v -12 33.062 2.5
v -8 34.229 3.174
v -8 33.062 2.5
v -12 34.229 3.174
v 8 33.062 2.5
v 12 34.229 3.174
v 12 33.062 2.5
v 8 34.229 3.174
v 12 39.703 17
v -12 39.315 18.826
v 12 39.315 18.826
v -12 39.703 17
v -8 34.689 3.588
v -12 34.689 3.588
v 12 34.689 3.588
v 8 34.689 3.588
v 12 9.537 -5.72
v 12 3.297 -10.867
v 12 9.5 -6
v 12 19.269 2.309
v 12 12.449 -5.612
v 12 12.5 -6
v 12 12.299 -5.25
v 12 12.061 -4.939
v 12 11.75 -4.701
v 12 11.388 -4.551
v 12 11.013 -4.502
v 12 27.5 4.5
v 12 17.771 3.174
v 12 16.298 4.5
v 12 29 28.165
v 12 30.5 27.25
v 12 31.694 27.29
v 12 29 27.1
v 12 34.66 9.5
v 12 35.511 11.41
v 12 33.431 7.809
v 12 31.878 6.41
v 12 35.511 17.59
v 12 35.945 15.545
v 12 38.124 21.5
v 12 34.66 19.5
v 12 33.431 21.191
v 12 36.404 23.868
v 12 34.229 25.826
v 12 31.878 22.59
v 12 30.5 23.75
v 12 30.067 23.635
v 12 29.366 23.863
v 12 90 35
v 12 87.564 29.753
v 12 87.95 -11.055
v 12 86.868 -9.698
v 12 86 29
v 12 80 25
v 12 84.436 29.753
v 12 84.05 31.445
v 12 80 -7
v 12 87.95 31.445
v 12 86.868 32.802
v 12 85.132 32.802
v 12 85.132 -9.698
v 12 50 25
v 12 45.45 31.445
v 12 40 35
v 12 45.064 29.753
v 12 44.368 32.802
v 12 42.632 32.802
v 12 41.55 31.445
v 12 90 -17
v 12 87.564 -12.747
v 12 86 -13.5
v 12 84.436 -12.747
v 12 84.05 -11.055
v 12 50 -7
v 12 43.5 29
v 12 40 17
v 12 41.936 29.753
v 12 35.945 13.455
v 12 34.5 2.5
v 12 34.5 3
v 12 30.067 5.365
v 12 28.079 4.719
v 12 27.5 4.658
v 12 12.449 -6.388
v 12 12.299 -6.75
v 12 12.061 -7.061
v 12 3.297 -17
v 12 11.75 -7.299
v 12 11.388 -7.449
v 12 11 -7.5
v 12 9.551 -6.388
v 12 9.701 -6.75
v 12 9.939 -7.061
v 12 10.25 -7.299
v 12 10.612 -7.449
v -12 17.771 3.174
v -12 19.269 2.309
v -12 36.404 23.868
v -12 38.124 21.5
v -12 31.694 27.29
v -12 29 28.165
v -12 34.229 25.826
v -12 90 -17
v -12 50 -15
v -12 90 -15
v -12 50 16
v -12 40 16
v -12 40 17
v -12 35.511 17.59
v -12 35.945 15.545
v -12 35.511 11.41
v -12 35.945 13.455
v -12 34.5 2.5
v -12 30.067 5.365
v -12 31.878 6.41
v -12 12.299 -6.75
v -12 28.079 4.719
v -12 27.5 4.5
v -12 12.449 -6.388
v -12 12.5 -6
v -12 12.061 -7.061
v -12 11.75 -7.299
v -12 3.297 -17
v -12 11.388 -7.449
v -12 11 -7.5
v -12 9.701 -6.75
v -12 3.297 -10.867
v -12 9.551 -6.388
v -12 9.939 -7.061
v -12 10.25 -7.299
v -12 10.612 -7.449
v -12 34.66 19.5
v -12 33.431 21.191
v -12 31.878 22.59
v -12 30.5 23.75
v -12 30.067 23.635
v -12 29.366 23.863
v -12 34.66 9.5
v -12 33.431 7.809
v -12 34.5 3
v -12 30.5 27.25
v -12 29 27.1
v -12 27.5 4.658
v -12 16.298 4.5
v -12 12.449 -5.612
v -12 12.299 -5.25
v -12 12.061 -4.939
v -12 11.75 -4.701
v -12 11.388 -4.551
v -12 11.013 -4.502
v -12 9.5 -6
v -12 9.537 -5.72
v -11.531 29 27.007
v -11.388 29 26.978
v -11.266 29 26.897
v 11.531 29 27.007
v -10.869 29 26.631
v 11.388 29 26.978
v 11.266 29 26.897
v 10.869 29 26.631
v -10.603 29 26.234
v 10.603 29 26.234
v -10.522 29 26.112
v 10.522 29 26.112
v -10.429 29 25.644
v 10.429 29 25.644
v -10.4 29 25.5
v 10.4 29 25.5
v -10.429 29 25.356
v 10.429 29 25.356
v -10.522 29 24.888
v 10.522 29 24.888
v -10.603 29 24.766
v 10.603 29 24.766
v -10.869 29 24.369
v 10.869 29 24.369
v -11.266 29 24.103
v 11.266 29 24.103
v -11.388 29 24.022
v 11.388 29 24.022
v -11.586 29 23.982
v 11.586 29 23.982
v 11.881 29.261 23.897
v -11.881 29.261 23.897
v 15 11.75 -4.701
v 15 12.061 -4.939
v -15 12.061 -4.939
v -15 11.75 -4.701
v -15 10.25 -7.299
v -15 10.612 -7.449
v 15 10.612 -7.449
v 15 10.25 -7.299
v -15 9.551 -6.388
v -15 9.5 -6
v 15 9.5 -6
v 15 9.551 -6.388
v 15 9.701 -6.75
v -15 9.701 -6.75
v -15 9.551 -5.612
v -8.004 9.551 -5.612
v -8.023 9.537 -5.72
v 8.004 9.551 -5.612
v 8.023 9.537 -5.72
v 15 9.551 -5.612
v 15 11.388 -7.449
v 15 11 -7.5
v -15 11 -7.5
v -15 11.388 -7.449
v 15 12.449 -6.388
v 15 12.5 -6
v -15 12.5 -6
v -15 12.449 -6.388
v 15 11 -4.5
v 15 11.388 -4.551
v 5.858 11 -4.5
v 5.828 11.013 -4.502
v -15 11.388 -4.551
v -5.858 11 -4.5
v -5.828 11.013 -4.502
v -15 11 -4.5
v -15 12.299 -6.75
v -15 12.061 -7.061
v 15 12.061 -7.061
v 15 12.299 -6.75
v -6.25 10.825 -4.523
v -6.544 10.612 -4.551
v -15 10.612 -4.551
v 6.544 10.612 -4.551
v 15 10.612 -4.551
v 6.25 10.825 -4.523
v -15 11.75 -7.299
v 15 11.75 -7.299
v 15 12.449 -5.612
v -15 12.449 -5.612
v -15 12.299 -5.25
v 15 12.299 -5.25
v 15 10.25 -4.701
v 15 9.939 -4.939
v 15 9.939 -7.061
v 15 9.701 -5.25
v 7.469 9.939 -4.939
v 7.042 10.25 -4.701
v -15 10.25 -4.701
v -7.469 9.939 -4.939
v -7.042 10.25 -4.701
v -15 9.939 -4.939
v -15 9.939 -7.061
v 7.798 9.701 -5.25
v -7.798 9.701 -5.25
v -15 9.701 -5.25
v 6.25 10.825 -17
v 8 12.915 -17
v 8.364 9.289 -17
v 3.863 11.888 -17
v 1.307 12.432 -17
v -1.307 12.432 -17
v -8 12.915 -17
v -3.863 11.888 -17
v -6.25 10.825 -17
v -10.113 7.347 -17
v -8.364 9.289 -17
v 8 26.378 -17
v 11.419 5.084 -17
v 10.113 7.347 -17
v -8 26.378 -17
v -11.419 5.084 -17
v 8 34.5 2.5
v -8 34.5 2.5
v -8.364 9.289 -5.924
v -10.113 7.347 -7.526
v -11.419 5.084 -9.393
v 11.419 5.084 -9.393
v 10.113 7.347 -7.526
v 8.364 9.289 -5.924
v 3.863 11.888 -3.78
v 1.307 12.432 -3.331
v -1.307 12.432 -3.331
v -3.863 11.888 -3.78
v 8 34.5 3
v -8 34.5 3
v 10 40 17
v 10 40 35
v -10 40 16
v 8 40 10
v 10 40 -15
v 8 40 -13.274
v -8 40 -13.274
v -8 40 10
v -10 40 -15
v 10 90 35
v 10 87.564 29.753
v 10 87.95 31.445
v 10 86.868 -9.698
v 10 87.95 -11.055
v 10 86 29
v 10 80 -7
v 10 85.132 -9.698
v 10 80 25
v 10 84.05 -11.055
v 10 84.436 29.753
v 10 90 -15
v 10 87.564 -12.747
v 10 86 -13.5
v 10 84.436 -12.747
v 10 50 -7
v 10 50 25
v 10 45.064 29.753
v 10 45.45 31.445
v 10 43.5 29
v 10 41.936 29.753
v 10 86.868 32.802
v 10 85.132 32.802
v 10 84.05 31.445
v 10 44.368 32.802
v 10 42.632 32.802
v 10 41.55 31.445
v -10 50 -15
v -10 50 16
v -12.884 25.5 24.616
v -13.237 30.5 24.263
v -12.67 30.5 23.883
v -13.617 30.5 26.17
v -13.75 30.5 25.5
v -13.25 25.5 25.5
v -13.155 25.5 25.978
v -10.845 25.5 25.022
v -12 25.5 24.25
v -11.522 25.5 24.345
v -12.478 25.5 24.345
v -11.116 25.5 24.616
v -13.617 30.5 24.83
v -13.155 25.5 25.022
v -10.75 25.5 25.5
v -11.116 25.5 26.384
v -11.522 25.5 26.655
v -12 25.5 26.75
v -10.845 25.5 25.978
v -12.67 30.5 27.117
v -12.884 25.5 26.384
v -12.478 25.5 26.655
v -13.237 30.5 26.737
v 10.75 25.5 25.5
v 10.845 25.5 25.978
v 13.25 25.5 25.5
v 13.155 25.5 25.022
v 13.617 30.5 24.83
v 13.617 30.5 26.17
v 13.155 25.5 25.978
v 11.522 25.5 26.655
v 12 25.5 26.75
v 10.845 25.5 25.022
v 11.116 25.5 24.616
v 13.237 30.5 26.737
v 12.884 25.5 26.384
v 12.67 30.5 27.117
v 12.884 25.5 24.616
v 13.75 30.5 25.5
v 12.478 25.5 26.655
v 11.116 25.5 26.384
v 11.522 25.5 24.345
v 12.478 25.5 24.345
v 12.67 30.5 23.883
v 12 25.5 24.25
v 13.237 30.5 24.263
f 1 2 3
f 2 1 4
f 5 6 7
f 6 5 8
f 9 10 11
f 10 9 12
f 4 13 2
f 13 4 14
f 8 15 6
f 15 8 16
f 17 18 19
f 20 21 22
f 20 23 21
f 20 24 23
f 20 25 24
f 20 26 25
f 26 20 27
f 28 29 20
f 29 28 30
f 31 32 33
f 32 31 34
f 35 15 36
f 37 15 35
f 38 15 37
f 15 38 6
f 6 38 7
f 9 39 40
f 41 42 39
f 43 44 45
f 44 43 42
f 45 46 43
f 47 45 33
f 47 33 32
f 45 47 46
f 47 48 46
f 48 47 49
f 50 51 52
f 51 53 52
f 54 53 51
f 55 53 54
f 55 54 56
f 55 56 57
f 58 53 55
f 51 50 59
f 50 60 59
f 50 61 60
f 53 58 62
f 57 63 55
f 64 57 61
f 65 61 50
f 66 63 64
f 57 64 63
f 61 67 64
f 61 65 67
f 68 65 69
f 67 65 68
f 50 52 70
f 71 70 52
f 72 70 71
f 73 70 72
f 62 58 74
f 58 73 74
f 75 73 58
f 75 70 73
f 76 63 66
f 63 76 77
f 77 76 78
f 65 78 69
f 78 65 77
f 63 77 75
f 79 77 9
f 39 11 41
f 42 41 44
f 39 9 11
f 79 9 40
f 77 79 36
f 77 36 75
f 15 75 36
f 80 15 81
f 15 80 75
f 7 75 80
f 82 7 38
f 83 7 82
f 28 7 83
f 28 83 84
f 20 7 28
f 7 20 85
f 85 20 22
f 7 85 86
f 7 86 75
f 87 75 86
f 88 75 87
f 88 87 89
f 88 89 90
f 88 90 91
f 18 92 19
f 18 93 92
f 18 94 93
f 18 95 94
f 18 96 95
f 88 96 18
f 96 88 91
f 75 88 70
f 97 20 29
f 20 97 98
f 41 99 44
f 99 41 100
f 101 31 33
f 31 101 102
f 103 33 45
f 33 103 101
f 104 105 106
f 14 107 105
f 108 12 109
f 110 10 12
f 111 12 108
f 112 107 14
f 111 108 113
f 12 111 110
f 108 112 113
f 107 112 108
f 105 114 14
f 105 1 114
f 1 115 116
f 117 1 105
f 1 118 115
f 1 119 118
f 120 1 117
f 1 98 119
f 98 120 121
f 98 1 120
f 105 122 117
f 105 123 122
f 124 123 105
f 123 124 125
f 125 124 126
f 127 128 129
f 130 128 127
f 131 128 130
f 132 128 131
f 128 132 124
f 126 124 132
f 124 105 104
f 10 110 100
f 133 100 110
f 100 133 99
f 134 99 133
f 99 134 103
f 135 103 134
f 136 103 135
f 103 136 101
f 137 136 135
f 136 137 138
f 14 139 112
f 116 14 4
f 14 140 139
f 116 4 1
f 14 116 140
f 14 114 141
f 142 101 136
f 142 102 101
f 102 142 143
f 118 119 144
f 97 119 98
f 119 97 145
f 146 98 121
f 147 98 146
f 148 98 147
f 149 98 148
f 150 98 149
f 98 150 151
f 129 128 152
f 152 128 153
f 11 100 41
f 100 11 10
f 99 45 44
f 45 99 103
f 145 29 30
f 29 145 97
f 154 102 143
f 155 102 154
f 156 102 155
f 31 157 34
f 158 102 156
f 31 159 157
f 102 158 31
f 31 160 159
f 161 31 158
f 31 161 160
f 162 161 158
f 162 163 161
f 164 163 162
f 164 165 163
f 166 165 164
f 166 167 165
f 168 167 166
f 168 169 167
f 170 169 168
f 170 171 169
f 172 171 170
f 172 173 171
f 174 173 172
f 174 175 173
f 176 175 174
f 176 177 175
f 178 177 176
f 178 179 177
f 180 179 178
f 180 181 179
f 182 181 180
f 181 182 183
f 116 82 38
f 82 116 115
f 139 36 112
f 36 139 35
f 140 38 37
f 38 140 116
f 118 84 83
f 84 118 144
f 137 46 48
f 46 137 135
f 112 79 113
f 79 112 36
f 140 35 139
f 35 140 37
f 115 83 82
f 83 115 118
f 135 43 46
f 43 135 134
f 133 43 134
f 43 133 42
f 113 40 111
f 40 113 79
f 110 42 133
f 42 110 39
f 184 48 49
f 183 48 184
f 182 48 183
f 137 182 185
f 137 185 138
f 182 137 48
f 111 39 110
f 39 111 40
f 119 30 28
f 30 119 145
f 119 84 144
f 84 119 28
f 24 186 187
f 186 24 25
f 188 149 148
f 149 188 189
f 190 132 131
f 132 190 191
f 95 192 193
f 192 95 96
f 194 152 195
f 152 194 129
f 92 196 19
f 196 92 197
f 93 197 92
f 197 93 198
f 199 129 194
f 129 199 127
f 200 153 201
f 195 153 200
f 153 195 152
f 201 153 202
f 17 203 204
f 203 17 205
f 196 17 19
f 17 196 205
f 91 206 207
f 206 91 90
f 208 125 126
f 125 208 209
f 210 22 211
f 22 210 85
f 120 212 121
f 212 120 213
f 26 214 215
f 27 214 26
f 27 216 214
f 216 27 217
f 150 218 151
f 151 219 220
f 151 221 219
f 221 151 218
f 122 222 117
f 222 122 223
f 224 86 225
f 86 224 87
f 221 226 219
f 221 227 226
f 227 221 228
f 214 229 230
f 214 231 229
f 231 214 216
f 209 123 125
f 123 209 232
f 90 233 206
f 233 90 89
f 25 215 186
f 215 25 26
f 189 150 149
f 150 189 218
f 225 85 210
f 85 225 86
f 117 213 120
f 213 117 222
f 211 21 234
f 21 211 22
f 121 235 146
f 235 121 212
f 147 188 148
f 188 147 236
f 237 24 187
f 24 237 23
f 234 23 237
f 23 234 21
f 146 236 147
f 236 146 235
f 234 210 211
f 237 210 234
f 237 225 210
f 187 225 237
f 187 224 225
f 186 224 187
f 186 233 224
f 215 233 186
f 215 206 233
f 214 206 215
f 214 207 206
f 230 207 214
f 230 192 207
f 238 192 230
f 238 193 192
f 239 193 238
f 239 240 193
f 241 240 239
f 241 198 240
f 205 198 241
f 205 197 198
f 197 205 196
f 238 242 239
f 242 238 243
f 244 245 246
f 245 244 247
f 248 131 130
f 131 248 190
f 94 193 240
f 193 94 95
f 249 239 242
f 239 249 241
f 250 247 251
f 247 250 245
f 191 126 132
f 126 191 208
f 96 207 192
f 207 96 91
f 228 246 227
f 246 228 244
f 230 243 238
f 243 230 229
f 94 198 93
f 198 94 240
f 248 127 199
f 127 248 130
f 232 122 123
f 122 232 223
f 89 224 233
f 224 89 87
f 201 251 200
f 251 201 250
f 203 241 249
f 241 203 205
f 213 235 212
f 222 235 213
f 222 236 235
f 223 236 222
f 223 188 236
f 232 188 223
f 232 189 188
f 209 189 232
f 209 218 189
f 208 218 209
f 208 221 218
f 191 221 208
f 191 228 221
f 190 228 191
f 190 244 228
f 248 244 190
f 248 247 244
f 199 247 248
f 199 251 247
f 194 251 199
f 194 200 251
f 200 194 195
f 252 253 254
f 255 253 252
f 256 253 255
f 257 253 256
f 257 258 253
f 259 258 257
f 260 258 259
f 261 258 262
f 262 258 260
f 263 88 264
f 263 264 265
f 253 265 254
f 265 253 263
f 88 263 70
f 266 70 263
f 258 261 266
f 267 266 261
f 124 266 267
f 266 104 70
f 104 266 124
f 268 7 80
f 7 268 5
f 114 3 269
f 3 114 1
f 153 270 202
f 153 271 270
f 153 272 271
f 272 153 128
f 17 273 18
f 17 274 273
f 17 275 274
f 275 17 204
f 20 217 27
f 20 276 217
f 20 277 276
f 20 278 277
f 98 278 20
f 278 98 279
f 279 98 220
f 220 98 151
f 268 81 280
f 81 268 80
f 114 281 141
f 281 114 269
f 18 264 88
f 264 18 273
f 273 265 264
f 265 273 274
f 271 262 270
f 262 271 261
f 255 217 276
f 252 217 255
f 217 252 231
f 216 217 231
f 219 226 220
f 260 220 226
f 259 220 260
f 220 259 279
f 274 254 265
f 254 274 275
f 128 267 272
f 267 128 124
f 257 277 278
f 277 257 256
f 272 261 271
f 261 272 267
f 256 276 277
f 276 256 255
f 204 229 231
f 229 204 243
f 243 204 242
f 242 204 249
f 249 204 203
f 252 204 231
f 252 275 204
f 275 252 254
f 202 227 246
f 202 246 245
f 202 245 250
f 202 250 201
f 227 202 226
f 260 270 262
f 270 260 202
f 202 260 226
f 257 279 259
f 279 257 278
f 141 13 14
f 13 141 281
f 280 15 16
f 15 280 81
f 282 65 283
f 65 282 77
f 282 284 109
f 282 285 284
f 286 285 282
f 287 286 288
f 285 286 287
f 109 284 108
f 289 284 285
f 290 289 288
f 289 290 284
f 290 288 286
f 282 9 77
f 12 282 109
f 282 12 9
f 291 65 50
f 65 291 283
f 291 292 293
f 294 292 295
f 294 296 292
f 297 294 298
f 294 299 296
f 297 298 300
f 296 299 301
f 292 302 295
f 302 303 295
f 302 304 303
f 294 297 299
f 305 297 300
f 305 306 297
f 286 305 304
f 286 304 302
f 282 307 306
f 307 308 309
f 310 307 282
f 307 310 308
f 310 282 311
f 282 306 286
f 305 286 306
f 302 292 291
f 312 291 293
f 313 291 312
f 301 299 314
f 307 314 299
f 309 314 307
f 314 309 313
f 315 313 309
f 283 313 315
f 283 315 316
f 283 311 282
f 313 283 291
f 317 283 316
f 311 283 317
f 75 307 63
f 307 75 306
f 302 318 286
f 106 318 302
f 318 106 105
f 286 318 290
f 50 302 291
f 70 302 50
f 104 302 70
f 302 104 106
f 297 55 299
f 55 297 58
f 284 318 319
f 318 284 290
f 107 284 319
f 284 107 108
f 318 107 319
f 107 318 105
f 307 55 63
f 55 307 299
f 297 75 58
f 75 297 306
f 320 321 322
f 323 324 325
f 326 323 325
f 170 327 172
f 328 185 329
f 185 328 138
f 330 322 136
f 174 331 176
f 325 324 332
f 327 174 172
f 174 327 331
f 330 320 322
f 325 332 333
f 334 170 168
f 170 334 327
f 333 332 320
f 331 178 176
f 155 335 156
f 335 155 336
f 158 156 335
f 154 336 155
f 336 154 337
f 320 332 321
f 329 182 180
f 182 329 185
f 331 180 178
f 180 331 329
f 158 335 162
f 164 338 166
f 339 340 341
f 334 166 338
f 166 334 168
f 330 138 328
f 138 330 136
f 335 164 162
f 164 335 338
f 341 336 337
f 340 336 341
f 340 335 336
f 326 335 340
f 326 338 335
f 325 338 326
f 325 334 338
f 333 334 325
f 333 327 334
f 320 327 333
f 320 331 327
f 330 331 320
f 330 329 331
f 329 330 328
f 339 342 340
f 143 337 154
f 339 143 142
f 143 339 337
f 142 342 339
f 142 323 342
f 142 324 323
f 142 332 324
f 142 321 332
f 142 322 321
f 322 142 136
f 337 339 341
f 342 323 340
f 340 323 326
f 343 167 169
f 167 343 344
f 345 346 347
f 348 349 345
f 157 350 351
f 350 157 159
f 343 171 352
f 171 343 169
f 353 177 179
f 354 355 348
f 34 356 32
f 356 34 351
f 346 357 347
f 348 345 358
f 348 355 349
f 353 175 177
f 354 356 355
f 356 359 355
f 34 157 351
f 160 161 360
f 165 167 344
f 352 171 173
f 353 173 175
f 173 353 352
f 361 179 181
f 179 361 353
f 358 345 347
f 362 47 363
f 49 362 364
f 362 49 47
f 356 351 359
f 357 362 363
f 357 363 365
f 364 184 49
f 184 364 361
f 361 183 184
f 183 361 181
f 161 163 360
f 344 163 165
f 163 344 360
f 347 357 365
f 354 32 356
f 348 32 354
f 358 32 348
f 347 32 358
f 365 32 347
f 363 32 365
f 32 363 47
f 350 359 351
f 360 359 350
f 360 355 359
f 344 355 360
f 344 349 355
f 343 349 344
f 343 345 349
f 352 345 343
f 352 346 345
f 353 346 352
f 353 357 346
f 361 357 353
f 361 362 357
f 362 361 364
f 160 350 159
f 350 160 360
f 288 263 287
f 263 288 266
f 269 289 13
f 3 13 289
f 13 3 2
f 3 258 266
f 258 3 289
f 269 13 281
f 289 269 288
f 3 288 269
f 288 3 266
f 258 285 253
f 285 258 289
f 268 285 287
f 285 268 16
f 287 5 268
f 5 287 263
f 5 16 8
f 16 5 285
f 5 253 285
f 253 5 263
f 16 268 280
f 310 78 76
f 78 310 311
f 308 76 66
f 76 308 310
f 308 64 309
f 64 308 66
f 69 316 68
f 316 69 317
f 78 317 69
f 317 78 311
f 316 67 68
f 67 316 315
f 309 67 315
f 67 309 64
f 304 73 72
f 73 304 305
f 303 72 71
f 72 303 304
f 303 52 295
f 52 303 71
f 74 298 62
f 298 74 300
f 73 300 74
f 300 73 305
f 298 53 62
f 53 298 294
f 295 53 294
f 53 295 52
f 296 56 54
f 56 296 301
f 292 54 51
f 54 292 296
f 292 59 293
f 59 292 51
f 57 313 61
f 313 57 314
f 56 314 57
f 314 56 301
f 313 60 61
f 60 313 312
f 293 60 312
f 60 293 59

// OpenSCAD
//use <e3d.scad>;
////translate([0,0,46])rotate([180,0,0])e3d();
//#translate([0,1+15,50+5])cube([50,2,100],center=true);
//
//#translate([0,-5,36])cube([36,10,10],center=true);
//
//color("blue")translate([0,0,-20])sphere(r=1);
//#translate([0,15,32+5])rotate([-90,0,0])import("carriaje 3 nuevo.stl", convexity = 8);
//
//difference(){
//union(){
//    difference(){
//        hull(){
//            translate([-11-13,-40+15,30])rotate([0,90,0])40mmfan();
//            rotate([0,0,180])translate([-11-13,-40+25,30])rotate([0,90,0])40mmfan();
//            
//        }
//
//        hull(){
//            translate([-11-5,-5,10])rotate([0,90,0])cylinder(r=38/2,h=1);
//            cylinder(r=17/2,h=26);
//        }
//    }
//
//
//    hull(){
//        translate([0,-5,0])cube([22,39,1],center=true);
//        translate([0,-5,-9])cube([30,34,1],center=true);
//    }
//    hull(){
//        translate([0,-5,26])cube([20,39,1],center=true);
//        translate([0,-5,29])cube([30,34,1],center=true);
//    }
//    translate([0,-26,0])
//difference(){
//hull(){
//    translate([-20/2,0,0])cube([20,1,5]);
//    translate([0,-10,0])cylinder(r=20/2,h=5);
//}
//translate([0,-10,-2])cylinder(r=12/2,h=8);
//}
//
//translate([0,-26,15])
//difference(){
//hull(){
//    translate([-20/2,0,0])cube([20,1,5]);
//    translate([0,-10,0])cylinder(r=20/2,h=5);
//}
//translate([0,-10,-2])cylinder(r=12/2,h=8);
//}
//}
//translate([0,0,-30])cylinder(r=23/2,h=70);
//translate([0,12.5-1.5,27.5-1.5]){
//
//    translate([0,0,0])rotate([0,90,0])cylinder(r=3/2,h=80,$fn=32,center=true);
//    translate([0,-32,0])rotate([0,90,0])cylinder(r=3/2,h=80,$fn=32,center=true);
//    translate([0,0,-32])rotate([0,90,0])cylinder(r=3/2,h=80,$fn=32,center=true);
//    translate([0,-32,-32])rotate([0,90,0])cylinder(r=3/2,h=80,$fn=32,center=true);
//
//}
//translate([0,0,-10])cube([21,60,20],center=true);
//translate([0,-50,-20])cube([50,1000,60]);
//translate([0,-18,-10])cylinder(r=8/2,h=50);
//translate([15,-23,10])rotate([0,90,0])cylinder(r=1,h=50,$fn=24,center=true);
//translate([15,13.5,10])rotate([0,90,0])cylinder(r=1,h=50,$fn=24,center=true);
//translate([0,-8,2])rotate([90,0,0])cylinder(r=1,h=20,$fn=24,center=true);
//difference(){
//hull(){
//    translate([0,27,-6.5])cube([24,15,19.5],center=true);
//    translate([0,0,-15])cube([24,1,3],center=true);
//}
//translate([0,0,-19.5])cylinder(r=25/2,h=20);
//}
//}
//
//
//translate([-23/2-0.5,18,25.5])rotate([90,0,0])cylinder(r1=2.5/2,r2=3.5/2,h=10,center=true,$fn=16);
//
//
//module 40mmfan(){
//    //translate([-5,-35,0])cube([40,40,1]);
//    translate([5,5,0])
//    hull(){
//    translate([0,0,9])cylinder(r=5,h=1,$fn=32);
//    translate([30,0,9])cylinder(r=5,h=1,$fn=32);
//    translate([0,30,9])cylinder(r=5,h=1,$fn=32);
//    translate([30,30,9])cylinder(r=5,h=1,$fn=32);
//    }
//}
//
//
//
//



difference(){
union(){
    
union(){
    hull(){
        translate([0,39.5,0])cube([20+4,1,30+4],center=true);
        translate([0,35,-6-1])cube([20+4,1,20],center=true);
    }

}

difference(){
translate([0,26,14.5])rotate([0,90,0])cylinder(r=14,h=24,center=true);

translate([0,14,14.5+8])rotate([0,0,0])cube([50,30,30],center=true);

translate([0,26,14.5])rotate([0,90,0])cylinder(r=10,h=30,center=true);
translate([0,20,9.5])cube([30,15,10],center=true);
}
difference(){
    union(){
        translate([0,11,-6])rotate([0,90,0])cylinder(r=1.5,h=30,center=true,$fn=24);
hull(){
    translate([0,27,-7.25])cube([24,15,19.5],center=true);
    translate([0,0,-15.5])cube([24,1,3],center=true);
}
}
translate([0,0,-19.5])cylinder(r=25/2,h=20);
}



translate([10,40,-17])cube([2,10,52]);
translate([-12,40,-17])cube([22,50,2]);

translate([10,80,-17])cube([2,10,52]);
translate([-12,40,-17])cube([2,10,33]);
translate([10,80-40,25])cube([2,50,10]);
translate([10,80-40,-17])cube([2,50,10]);

translate([-23/2-0.5,18+10,25.5])rotate([90,0,180])cylinder(r1=2.5/2,r2=3.5/2,h=5,center=true,$fn=16);
translate([(-23/2-0.5)*-1,18+10,25.5])rotate([90,0,180])cylinder(r1=2.5/2,r2=3.5/2,h=5,center=true,$fn=16);
}
hull(){
translate([-8,40,-13])cube([16,1,23]);
translate([-8,8,-22])cube([16,0.1,0.1]);
}
translate([0,43.5,31])rotate([0,90,0])cylinder(r=2,h=30,center=true);
translate([0,43.5+42.5,-11.5])rotate([0,90,0])cylinder(r=2,h=30,center=true);
translate([0,43.5+42.5,-11.5+42.5])rotate([0,90,0])cylinder(r=2,h=30,center=true);

}
//translate([20/2,34+20-15+1,-15])turbina();

module turbina(){
    //translate([3.5,3.5,-2])cylinder(r=3.2/2,h=30,$fn=32);
rotate([0,-90,0])
    difference(){
    union(){
        translate([0,0,0])cube([27,25,20]);
        translate([50/2,50/2,0])cylinder(r=50/2,h=20);
        translate([3/2,3/2,0]){
            hull(){
                translate([0,0,0])cylinder(r=3/2,h=4,$fn=16);
                translate([50-3,0,0])cylinder(r=3/2,h=4,$fn=16);
                translate([0,50-3,0])cylinder(r=3/2,h=4,$fn=16);
                translate([50-3,50-3,0])cylinder(r=3/2,h=4,$fn=16);
            }
        }
    }
    translate([2,-10,2])cube([27,25,16]);
    translate([3.5+42.5,3.5,-2])cylinder(r=3.2/2,h=30,$fn=32);
    translate([3.5,42.5+3.5,-2])cylinder(r=3.2/2,h=30,$fn=32);
    translate([3.5+42.5,3.5+42.5,-2])cylinder(r=3.2/2,h=30,$fn=32);
}
}
